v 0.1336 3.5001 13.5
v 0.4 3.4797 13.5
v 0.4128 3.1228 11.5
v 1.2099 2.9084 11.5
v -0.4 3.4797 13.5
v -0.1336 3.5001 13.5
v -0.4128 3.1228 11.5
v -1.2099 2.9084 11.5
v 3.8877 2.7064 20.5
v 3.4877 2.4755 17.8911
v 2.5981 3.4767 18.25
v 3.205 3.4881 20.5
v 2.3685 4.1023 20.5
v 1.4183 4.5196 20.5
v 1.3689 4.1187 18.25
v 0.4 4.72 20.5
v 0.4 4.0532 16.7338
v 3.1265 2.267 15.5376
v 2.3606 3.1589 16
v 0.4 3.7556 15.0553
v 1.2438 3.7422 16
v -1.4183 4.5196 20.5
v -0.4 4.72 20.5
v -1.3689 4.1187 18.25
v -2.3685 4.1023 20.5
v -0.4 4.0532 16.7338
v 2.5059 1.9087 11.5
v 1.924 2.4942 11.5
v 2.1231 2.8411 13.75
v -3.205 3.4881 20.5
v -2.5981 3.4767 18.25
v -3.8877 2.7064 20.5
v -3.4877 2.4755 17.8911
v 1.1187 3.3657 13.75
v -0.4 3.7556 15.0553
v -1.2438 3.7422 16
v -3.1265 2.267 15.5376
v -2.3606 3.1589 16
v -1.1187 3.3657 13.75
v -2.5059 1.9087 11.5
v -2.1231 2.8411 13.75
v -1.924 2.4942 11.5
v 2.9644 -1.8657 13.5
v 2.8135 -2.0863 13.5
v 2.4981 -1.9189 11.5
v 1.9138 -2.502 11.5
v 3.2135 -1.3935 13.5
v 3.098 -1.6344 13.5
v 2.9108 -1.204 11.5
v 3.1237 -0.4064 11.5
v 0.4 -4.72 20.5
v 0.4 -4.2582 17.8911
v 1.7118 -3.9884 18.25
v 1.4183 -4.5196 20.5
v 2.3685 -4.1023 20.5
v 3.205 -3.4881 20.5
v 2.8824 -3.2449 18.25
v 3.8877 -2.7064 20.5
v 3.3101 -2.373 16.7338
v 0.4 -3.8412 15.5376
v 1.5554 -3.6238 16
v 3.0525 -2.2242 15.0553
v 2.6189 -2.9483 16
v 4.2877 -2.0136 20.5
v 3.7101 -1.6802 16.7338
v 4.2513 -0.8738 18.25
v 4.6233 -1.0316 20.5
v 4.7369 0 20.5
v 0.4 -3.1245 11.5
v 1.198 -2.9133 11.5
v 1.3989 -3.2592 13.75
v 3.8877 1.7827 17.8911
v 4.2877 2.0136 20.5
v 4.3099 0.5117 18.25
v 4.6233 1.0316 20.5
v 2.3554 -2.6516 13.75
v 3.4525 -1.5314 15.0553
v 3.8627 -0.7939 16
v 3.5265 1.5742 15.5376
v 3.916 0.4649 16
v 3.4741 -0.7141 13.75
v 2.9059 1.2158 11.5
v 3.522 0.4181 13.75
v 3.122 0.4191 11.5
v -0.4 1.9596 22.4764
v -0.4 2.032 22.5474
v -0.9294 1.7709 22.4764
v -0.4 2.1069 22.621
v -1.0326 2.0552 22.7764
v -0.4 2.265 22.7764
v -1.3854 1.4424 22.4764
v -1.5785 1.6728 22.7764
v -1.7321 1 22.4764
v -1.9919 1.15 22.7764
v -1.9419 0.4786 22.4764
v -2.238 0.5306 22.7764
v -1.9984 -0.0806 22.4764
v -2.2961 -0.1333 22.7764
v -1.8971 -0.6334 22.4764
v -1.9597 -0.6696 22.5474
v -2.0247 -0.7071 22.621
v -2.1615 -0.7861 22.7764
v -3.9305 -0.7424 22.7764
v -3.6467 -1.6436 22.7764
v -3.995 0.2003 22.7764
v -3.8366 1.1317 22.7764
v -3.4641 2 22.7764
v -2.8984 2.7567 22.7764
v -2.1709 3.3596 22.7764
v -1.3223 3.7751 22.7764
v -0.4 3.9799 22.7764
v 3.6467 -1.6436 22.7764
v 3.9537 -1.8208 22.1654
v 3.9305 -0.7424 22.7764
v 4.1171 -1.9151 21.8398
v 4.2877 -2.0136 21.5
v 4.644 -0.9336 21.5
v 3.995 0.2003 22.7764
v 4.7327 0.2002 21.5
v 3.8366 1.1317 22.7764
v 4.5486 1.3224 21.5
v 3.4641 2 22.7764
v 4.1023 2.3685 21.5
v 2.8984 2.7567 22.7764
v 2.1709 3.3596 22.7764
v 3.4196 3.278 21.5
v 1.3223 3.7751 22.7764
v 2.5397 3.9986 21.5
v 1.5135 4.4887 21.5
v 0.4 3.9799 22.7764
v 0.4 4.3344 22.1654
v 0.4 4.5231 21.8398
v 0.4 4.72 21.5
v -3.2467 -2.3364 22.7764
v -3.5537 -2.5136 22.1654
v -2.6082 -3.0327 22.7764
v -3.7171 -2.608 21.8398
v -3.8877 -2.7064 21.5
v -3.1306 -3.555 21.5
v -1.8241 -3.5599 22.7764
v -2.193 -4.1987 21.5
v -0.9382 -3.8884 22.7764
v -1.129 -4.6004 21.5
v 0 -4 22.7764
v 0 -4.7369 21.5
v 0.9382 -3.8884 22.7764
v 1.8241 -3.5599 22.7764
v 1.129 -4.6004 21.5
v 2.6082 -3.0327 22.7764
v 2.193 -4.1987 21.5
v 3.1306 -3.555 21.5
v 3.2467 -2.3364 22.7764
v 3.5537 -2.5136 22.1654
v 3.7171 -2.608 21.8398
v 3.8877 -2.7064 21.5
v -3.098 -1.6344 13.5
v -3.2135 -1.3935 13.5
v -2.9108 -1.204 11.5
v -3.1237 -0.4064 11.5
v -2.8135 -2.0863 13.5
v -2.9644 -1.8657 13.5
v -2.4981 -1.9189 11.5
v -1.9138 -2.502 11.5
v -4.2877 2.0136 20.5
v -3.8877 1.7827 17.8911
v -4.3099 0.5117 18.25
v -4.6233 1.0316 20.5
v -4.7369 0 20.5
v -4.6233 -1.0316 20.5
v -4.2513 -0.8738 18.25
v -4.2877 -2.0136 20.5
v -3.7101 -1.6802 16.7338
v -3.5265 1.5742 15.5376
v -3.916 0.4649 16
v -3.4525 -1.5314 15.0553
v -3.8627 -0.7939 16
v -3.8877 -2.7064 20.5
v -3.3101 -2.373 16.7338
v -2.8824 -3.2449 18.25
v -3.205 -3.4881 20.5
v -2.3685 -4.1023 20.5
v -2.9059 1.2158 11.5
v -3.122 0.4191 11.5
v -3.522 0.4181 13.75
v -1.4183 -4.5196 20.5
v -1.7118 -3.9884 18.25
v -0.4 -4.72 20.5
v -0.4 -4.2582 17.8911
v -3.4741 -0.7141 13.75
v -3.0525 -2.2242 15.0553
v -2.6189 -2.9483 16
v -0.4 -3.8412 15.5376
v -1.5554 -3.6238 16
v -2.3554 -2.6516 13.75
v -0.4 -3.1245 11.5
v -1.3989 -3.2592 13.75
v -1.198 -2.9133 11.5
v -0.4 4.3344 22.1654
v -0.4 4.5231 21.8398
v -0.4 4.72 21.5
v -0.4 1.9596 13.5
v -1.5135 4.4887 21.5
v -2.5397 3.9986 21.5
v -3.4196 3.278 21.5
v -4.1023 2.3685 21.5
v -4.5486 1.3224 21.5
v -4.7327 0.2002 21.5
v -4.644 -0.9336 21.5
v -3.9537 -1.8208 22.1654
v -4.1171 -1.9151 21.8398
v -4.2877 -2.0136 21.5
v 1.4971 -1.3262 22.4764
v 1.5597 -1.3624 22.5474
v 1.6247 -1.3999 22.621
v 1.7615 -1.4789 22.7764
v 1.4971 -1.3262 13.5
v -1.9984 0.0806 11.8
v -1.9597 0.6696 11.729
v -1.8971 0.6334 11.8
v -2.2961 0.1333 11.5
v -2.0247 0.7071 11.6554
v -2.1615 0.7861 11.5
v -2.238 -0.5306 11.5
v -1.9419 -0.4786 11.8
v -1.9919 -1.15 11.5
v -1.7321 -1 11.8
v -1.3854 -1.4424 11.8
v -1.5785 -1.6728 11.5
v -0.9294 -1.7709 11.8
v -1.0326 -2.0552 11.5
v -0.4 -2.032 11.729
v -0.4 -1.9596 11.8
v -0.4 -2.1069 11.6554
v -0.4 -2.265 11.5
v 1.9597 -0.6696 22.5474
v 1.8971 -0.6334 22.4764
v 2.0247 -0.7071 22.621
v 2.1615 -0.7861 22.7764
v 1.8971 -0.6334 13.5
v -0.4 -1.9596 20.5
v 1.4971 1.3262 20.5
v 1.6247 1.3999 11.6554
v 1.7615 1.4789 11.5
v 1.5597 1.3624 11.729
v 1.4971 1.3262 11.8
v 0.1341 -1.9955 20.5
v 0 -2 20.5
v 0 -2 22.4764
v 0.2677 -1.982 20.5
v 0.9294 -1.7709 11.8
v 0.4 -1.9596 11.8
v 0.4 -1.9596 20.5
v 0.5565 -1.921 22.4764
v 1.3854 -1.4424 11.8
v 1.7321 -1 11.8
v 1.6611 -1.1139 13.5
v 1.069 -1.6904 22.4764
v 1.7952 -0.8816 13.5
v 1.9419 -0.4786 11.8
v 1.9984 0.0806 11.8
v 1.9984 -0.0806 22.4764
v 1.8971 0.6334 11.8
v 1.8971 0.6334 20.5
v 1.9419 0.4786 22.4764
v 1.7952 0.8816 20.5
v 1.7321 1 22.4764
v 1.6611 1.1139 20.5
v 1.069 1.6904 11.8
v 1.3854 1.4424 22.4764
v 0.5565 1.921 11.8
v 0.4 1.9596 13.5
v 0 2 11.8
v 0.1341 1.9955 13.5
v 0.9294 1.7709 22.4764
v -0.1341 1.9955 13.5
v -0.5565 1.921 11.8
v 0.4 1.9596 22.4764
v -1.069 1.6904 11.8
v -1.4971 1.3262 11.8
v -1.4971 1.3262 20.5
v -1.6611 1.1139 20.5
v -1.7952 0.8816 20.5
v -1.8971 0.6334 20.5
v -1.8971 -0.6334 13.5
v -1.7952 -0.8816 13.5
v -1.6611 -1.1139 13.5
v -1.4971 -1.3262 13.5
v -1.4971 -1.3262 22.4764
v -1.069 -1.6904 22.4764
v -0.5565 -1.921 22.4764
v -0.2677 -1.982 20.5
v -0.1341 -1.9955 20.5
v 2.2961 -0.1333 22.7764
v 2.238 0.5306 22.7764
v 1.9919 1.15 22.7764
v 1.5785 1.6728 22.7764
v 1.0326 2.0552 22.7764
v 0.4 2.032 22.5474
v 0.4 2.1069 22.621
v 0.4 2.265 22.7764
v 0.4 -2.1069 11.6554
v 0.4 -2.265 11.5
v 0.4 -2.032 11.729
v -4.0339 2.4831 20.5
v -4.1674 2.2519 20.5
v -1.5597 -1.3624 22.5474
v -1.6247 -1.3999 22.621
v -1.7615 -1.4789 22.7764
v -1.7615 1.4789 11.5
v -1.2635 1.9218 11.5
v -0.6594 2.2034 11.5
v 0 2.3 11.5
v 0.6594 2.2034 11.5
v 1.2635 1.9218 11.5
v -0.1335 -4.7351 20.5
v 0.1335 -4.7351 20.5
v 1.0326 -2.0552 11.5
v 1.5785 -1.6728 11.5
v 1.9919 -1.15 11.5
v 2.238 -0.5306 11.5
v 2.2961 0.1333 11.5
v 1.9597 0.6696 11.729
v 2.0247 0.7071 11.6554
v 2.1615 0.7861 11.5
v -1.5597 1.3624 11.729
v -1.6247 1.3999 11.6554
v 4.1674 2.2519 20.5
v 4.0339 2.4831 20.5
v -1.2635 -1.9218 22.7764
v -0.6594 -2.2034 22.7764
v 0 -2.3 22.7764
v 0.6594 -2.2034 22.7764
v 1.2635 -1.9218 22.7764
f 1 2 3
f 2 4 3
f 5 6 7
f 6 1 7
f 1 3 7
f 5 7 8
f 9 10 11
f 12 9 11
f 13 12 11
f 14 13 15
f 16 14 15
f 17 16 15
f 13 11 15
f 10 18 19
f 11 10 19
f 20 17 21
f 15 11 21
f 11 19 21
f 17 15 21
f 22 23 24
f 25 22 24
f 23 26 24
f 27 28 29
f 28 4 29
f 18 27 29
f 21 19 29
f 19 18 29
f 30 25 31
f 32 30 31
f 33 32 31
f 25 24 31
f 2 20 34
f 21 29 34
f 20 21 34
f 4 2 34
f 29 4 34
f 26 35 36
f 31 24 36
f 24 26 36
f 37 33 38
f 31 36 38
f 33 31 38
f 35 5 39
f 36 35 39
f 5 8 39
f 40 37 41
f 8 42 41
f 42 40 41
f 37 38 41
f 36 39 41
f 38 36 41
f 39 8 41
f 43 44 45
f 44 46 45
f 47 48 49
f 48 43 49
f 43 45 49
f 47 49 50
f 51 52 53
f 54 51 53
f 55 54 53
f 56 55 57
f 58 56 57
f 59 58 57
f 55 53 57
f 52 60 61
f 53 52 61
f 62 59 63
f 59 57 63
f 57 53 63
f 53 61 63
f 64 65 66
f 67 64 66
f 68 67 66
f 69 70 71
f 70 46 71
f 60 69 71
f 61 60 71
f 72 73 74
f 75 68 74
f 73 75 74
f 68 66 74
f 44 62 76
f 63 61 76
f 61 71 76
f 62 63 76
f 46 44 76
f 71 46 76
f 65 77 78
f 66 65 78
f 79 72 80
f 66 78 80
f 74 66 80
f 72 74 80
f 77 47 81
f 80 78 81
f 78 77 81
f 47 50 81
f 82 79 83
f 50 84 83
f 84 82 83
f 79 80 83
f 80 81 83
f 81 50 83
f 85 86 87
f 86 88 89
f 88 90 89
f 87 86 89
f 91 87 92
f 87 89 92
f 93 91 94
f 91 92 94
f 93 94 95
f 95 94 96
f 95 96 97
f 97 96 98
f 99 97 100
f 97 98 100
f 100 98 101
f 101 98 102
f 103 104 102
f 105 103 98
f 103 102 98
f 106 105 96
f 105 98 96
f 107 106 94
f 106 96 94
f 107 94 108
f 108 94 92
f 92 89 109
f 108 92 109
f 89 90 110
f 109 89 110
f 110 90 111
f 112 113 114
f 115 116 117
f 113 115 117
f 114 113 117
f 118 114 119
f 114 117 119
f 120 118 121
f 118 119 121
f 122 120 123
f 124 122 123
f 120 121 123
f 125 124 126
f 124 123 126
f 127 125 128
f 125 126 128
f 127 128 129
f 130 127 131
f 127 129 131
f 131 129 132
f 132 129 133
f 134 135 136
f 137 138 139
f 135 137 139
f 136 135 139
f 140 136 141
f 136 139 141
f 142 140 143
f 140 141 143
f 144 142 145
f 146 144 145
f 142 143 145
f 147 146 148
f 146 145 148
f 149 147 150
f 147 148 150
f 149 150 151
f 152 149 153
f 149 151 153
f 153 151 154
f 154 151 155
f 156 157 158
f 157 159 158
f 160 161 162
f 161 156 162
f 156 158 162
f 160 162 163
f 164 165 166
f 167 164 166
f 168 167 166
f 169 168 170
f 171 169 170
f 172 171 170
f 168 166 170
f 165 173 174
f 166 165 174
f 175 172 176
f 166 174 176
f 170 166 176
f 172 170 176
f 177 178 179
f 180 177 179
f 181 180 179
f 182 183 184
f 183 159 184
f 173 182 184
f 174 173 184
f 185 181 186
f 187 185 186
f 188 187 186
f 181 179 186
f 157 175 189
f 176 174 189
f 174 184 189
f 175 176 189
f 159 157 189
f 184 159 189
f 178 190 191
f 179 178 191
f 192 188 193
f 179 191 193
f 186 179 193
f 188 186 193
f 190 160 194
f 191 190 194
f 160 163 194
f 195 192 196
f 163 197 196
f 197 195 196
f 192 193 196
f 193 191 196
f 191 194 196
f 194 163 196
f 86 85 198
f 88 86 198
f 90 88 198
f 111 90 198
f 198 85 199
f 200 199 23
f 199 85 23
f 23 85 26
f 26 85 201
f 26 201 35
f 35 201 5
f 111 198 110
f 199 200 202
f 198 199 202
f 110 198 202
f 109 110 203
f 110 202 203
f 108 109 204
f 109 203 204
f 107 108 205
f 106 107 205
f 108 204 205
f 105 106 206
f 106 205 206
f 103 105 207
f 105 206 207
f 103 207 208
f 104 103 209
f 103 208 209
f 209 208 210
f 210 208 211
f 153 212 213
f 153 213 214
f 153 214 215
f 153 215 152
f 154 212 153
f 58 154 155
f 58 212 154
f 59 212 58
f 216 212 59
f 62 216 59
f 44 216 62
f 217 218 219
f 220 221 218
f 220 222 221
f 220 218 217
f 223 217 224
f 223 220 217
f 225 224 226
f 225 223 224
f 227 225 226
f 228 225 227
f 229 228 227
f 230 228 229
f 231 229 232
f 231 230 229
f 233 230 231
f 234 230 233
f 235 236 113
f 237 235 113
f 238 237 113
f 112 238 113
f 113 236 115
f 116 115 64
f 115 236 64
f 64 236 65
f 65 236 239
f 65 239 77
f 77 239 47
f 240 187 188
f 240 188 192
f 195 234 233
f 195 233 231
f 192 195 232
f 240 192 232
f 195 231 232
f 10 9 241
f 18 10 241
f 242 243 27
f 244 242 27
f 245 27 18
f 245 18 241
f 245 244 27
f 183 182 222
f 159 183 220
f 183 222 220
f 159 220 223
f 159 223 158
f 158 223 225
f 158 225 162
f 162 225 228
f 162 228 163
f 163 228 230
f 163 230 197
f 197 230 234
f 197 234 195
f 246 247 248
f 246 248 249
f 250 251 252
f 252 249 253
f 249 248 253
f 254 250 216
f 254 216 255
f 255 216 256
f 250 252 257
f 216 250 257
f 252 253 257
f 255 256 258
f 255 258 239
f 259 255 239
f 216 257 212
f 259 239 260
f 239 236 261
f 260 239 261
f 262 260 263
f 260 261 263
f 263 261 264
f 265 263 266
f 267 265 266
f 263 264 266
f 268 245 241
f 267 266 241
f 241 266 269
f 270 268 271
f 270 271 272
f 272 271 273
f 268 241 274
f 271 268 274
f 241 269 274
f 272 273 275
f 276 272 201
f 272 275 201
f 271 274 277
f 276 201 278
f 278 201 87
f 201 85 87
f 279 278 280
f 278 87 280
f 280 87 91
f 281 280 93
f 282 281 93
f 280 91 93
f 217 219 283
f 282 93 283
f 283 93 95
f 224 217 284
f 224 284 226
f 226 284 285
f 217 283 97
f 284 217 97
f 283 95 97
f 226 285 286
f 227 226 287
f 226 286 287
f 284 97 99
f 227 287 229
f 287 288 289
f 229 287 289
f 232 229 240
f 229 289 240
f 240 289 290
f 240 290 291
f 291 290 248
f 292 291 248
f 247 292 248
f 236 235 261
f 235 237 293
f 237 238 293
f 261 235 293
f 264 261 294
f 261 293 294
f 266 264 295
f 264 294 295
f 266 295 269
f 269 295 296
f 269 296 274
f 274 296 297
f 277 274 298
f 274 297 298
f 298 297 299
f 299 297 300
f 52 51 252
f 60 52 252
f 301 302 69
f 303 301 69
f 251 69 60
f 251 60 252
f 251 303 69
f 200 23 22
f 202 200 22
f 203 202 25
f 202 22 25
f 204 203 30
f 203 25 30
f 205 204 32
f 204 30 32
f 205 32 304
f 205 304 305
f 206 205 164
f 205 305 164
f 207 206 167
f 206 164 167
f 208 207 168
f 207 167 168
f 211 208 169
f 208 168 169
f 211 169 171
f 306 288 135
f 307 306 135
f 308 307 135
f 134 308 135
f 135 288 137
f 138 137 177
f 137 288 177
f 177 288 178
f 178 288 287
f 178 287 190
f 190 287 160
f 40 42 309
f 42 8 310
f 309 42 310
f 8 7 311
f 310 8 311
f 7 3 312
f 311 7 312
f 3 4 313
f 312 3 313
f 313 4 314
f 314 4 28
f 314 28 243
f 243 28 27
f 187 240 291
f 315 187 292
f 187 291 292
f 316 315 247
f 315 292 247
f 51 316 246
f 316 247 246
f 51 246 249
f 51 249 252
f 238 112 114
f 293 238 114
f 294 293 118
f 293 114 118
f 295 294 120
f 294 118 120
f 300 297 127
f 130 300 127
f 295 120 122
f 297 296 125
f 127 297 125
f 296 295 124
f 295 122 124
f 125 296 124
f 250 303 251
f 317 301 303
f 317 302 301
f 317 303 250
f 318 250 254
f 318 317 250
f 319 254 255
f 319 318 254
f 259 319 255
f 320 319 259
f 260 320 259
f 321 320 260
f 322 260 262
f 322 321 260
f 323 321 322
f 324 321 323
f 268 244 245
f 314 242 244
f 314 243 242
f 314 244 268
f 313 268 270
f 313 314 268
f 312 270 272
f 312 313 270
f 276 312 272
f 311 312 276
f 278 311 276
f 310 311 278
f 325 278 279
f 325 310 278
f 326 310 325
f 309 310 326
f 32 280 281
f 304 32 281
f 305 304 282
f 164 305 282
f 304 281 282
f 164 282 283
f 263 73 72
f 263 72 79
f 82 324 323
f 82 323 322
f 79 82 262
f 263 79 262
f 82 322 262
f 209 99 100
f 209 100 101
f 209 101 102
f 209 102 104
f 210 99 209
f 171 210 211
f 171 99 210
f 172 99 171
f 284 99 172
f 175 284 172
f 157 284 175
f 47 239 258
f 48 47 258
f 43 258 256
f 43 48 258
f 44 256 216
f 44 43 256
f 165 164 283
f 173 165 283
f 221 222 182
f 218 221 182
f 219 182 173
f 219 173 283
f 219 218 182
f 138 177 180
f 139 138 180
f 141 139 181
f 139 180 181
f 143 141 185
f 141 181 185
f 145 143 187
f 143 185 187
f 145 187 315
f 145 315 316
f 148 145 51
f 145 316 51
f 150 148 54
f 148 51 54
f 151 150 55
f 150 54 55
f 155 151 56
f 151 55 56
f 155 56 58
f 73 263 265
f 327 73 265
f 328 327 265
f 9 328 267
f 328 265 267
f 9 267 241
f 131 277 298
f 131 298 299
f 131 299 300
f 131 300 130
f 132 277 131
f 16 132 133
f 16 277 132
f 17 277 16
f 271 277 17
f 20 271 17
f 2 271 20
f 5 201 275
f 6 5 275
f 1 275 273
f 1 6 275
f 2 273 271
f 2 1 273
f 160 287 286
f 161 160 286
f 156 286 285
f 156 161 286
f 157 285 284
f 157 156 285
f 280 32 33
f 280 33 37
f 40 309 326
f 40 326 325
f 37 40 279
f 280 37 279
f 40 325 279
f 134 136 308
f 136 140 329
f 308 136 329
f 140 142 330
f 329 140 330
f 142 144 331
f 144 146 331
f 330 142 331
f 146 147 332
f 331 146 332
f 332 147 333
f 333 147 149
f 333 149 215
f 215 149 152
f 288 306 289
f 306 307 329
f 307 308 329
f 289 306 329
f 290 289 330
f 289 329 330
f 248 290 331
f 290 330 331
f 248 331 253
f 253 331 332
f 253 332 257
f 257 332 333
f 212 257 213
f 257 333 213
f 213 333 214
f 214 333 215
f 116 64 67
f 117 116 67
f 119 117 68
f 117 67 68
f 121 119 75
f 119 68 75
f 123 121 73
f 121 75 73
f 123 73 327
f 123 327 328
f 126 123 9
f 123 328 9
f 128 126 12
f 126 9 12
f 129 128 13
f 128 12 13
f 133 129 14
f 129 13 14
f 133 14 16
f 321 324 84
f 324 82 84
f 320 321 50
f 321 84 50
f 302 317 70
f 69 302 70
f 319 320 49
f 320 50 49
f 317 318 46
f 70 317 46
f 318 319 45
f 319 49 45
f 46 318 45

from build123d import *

# Parameters (mm, degrees)
CHAMFER006_SIZE       = 0.3
SKETCH001_W           = 0.8
SKETCH001_H           = 5
POCKET003_DEPTH       = 44.301226966
POLARPATTERN003_COUNT = 3
SKETCH009_W           = 0.8
SKETCH009_H           = 5
POCKET004_DEPTH       = 9
POLARPATTERN004_COUNT = 3


with BuildPart() as part:
    # Sketch008 → Revolution001 (revolve)
    with BuildSketch(Plane.YZ):
        Polygon((-2, 0), (-2, 11.2764224176), (-4, 11.2764224176), (-4.7369428264, 10), (-4.7369428264, 9), (-3.15, 0), align=None)
    revolve(axis=Axis((0, 0, 0), (0, 0, 1)))

    # Chamfer006
    chamfer006_edges = [part.edges().sort_by_distance(p)[0] for p in [
        (0, 2, 11.276422),
        (0, 2, 0),
    ]]
    chamfer(chamfer006_edges, length=CHAMFER006_SIZE)

    # Sketch001 → Pocket003 (cut, through all)
    with BuildSketch(Plane.XY.offset(2)):
        with Locations((0, 2.5)):
            Rectangle(SKETCH001_W, SKETCH001_H)
    pocket003 = extrude(amount=POCKET003_DEPTH, mode=Mode.SUBTRACT)

    # PolarPattern003: Pocket003 ×3 about axis
    polarpattern003_axis = Axis((0, 0, 2), (0, 0, 1))
    for i in range(1, POLARPATTERN003_COUNT):
        add(pocket003.rotate(polarpattern003_axis, i * 360 / POLARPATTERN003_COUNT), mode=Mode.SUBTRACT)

    # Sketch009 → Pocket004 (cut)
    with BuildSketch(Plane.XY):
        with Locations((0, -2.5)):
            Rectangle(SKETCH009_W, SKETCH009_H)
    pocket004 = extrude(amount=POCKET004_DEPTH, mode=Mode.SUBTRACT)

    # PolarPattern004: Pocket004 ×3 about axis
    polarpattern004_axis = Axis((0, 0, 0), (0, 0, 1))
    for i in range(1, POLARPATTERN004_COUNT):
        add(pocket004.rotate(polarpattern004_axis, i * 360 / POLARPATTERN004_COUNT), mode=Mode.SUBTRACT)


with BuildPart() as part_1:
    # Body003 placement: moved
    add(part.part.moved(Location((0, 0, 11.5))))


solid = part_1.part
